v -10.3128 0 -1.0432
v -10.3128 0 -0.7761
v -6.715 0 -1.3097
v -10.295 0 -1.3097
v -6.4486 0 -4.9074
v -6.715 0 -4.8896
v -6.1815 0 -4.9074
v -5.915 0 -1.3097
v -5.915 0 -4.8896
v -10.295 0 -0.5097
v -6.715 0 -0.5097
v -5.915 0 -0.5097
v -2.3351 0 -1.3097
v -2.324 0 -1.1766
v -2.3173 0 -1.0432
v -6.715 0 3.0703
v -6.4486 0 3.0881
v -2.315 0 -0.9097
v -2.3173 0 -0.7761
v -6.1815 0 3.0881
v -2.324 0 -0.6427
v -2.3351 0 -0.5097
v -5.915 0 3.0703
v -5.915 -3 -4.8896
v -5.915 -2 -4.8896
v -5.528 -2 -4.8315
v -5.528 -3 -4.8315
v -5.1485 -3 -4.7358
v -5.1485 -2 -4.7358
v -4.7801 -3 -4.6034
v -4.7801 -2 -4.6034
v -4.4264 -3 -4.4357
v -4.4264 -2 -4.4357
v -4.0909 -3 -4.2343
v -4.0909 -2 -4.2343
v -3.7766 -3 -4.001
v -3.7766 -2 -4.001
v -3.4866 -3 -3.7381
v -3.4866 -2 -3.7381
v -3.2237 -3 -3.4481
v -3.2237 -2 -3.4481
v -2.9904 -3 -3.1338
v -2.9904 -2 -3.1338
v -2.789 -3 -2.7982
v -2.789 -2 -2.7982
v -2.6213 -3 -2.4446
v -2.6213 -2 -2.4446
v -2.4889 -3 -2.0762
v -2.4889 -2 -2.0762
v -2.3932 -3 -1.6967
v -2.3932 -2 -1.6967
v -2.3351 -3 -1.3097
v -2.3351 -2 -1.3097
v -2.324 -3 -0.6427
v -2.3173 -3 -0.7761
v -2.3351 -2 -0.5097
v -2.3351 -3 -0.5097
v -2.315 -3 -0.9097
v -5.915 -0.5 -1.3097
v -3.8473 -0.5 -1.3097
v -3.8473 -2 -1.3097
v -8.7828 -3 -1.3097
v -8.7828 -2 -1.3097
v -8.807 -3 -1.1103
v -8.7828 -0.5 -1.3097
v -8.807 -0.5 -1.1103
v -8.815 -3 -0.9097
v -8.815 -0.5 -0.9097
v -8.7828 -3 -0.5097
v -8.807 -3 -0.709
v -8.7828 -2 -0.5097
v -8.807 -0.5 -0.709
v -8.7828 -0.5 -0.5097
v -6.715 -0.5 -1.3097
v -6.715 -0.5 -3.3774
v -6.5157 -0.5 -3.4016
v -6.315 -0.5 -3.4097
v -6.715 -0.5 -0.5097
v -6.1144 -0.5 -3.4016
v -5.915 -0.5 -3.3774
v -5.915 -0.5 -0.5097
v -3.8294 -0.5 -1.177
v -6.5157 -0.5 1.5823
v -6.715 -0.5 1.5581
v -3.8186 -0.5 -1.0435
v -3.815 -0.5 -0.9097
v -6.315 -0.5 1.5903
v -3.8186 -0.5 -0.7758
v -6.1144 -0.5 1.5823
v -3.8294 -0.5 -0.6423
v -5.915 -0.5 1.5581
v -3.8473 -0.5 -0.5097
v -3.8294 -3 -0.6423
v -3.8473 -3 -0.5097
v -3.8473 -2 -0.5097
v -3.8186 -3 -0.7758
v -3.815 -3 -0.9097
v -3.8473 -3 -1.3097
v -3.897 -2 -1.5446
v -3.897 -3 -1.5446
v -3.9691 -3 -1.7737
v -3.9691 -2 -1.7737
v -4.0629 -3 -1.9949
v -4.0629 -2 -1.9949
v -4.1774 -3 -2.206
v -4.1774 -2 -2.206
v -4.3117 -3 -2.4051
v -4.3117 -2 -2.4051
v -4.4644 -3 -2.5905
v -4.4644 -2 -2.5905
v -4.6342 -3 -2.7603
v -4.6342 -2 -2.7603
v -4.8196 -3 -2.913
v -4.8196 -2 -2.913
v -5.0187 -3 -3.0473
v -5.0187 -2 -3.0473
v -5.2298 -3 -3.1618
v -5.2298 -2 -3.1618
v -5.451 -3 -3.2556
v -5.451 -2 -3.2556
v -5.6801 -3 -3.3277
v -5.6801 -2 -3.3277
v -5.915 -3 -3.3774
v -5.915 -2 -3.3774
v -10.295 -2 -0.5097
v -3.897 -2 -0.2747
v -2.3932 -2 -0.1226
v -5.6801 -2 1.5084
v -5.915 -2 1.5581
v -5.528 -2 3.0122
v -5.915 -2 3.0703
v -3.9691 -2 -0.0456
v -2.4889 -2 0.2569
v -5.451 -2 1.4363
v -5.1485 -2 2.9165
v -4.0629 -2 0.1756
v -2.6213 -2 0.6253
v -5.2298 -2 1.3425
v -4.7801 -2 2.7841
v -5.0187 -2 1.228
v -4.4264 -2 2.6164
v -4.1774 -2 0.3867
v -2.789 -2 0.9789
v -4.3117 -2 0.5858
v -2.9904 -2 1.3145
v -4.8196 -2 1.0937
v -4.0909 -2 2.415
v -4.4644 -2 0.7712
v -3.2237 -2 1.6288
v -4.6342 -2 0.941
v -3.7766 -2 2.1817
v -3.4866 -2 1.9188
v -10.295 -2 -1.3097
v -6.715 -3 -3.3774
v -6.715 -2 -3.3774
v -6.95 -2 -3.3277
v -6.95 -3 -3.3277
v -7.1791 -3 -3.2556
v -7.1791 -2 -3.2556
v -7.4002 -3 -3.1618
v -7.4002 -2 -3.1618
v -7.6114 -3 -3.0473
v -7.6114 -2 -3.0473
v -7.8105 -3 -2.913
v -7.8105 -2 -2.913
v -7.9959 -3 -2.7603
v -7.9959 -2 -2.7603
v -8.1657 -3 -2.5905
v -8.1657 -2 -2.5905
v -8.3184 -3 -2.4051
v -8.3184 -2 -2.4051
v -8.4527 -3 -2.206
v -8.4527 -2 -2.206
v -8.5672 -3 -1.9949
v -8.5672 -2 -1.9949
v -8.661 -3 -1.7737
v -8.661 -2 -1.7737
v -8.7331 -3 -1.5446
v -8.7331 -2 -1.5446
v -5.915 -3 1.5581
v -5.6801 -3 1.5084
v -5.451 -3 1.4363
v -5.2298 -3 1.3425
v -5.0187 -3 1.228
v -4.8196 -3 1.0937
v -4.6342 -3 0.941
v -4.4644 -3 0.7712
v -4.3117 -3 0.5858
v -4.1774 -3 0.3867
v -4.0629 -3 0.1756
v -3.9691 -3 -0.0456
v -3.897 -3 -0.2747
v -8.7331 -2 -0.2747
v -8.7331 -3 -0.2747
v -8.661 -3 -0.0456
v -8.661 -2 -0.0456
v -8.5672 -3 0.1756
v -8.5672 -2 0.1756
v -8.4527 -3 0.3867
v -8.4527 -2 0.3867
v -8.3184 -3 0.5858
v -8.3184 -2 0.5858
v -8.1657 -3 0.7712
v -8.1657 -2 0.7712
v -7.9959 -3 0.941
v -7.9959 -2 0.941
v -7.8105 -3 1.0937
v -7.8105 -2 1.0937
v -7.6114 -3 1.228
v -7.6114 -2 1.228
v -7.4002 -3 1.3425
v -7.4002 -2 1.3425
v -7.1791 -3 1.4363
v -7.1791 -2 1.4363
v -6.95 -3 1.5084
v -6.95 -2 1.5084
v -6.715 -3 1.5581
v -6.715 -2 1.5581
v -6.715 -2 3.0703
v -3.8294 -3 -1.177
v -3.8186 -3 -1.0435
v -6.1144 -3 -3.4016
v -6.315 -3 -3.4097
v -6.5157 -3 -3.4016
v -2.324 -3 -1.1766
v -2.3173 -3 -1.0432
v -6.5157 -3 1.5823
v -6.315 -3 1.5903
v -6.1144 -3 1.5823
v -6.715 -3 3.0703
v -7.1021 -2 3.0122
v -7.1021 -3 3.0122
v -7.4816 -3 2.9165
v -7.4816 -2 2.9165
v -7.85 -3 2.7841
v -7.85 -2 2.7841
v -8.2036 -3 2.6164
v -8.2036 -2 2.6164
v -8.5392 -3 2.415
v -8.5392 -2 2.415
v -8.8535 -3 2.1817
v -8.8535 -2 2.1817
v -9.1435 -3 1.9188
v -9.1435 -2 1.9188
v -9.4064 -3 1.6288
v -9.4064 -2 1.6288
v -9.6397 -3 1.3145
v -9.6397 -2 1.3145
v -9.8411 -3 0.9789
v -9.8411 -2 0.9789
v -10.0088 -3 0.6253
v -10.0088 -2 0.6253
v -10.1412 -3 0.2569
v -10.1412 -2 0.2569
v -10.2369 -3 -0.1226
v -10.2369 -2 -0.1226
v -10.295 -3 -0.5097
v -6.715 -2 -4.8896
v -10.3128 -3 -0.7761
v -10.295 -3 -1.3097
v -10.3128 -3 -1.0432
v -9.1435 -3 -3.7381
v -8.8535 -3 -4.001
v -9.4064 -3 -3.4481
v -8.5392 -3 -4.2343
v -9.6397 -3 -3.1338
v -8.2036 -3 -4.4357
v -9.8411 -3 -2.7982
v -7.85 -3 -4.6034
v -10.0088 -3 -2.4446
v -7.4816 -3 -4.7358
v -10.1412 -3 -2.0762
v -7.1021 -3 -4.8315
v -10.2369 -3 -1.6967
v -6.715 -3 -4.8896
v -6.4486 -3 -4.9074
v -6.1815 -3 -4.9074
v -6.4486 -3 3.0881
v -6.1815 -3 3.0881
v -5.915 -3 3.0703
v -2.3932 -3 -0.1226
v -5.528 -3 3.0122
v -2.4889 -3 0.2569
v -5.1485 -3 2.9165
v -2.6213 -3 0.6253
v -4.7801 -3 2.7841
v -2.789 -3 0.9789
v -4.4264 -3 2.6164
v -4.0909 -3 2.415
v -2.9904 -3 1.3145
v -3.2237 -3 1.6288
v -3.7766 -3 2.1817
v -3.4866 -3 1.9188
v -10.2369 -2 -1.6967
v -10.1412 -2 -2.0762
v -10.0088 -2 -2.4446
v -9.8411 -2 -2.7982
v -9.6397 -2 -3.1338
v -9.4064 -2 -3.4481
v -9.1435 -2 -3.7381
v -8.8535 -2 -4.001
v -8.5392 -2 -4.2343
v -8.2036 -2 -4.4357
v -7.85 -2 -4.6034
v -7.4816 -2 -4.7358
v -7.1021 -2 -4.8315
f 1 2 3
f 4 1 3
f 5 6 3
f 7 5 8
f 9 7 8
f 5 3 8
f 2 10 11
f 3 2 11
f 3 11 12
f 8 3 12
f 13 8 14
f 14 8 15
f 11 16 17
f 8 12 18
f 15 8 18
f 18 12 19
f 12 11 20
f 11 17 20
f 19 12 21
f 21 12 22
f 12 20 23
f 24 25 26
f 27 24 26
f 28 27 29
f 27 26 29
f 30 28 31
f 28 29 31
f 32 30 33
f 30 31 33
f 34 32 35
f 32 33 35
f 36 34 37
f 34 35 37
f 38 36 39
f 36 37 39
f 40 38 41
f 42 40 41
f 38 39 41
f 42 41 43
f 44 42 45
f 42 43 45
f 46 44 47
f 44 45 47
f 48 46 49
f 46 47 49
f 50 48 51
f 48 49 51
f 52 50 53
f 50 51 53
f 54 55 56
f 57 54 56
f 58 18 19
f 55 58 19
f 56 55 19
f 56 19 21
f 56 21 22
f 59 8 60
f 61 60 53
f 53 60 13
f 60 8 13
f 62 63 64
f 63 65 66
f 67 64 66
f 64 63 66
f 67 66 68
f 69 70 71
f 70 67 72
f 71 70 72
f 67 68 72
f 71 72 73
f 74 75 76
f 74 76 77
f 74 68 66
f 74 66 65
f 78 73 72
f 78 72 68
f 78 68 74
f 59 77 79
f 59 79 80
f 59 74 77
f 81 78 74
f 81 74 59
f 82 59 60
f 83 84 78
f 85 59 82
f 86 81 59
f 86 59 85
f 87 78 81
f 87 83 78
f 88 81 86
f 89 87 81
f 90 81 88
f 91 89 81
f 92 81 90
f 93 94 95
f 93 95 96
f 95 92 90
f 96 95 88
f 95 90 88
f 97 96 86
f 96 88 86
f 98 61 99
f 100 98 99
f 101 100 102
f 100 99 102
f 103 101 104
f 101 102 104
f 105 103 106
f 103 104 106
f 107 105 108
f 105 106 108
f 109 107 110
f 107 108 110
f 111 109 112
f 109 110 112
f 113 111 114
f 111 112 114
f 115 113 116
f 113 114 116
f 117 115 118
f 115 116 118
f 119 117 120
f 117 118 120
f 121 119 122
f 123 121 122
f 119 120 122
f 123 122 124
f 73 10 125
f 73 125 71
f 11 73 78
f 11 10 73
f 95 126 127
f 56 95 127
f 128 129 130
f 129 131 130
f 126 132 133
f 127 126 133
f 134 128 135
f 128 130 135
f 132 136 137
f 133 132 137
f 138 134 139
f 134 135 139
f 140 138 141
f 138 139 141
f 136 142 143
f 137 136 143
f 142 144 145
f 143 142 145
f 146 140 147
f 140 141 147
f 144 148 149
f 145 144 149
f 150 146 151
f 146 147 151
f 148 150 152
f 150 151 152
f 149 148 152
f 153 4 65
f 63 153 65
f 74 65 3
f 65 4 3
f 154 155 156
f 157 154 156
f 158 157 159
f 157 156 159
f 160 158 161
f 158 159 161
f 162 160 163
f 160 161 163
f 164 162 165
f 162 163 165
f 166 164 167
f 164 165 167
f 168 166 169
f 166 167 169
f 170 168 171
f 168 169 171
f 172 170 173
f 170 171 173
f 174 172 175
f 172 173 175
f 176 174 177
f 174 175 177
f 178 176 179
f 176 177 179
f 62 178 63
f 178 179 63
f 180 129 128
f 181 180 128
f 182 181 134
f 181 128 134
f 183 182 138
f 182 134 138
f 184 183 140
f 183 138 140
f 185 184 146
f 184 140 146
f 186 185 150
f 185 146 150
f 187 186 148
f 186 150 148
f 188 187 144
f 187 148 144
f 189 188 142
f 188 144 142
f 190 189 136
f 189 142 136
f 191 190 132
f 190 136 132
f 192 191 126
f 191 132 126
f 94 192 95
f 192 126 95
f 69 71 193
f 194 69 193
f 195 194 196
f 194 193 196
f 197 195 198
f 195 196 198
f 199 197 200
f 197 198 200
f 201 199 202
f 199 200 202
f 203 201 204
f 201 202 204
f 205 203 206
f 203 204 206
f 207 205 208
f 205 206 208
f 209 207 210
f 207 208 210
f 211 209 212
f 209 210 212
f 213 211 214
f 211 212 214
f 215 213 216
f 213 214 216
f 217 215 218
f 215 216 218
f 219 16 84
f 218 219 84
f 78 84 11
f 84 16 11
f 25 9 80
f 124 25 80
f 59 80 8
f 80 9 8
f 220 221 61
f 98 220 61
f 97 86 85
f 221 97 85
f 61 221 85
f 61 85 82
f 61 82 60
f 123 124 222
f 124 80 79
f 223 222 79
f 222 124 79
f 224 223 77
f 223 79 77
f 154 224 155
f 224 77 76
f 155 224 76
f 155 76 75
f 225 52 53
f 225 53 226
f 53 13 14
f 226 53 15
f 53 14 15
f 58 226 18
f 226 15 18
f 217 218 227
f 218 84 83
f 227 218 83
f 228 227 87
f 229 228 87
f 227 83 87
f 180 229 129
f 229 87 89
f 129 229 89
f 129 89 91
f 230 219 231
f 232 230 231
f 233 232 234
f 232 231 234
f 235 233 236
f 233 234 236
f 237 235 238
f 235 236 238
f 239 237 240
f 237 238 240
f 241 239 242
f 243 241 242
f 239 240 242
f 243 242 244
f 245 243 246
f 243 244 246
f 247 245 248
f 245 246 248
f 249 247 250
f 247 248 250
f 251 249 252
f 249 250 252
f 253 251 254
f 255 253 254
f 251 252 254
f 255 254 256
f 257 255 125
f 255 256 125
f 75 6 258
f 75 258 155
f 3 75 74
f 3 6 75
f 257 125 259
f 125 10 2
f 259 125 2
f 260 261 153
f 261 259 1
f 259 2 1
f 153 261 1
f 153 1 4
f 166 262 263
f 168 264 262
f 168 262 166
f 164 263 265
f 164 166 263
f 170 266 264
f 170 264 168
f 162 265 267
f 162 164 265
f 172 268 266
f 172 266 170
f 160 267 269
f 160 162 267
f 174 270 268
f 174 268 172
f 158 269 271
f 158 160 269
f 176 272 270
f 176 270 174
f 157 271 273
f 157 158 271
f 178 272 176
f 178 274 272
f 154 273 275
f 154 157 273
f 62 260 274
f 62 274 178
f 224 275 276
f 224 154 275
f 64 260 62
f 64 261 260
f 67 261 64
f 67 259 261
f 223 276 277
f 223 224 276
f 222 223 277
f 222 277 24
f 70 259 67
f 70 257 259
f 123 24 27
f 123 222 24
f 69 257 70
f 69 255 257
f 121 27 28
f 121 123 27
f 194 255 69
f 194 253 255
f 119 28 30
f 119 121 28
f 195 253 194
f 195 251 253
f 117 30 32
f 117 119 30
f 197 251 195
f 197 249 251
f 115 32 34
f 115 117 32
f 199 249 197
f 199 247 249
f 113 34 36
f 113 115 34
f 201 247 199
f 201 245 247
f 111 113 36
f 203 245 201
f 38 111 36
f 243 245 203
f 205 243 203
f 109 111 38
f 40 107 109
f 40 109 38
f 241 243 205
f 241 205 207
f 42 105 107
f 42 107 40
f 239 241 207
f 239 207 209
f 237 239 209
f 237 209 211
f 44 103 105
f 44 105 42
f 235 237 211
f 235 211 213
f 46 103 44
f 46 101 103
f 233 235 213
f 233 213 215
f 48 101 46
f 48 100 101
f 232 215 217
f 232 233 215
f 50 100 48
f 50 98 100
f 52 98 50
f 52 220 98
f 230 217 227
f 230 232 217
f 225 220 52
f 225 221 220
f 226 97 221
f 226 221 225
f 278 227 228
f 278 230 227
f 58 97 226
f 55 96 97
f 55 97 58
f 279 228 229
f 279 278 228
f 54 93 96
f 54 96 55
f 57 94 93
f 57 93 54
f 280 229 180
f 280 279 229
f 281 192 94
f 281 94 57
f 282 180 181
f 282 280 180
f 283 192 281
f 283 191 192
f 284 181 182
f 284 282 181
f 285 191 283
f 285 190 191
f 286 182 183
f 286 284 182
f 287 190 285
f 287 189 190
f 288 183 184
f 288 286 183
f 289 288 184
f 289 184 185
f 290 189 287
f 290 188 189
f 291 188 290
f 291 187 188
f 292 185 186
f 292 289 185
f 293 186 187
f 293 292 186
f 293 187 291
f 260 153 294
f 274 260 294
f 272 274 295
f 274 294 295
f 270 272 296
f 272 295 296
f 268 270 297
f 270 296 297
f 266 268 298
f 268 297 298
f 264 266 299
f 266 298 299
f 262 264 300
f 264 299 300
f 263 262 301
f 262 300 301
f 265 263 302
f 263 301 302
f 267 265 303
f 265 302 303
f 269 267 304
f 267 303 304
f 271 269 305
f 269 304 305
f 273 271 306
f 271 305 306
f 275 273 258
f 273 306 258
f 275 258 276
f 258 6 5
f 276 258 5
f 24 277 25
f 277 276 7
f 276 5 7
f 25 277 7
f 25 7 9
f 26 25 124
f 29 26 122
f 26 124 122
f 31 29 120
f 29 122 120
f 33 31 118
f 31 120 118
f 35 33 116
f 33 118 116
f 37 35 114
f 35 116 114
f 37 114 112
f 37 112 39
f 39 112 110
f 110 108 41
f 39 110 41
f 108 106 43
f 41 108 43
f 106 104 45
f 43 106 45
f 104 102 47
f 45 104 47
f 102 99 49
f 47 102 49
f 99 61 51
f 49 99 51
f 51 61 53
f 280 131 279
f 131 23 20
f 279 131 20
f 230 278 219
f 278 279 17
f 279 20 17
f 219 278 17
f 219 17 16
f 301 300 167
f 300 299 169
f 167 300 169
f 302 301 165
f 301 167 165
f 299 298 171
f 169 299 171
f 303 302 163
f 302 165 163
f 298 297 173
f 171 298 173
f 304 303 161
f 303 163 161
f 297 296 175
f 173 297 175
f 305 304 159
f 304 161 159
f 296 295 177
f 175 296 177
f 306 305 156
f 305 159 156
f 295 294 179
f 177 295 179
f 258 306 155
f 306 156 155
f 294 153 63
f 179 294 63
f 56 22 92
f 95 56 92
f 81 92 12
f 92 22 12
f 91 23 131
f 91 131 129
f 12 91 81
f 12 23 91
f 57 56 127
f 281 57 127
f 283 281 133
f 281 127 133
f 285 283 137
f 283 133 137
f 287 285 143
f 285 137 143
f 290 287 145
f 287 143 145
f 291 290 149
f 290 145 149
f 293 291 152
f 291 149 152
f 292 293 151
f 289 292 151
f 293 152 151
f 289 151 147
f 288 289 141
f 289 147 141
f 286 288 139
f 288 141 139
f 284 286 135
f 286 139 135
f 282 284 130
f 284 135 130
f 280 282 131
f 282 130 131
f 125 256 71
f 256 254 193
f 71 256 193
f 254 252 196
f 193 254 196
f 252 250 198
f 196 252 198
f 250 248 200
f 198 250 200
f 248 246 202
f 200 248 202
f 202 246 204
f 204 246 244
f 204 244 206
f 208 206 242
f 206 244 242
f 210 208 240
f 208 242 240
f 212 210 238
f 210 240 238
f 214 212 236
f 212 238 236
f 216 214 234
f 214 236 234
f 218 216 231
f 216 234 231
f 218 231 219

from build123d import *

# Parameters (mm, degrees)
F1_DEPTH = 3
F0_W     = 0.8
F0_H     = 0.8
F2_DEPTH = 0.5
F3_DEPTH = 2


with BuildPart() as f1:
    # F0 (on Front) → F1 (new body)
    with BuildSketch(Plane.XZ):
        with BuildLine():
            Line((-6.7150478527, -4.8896004256), (-6.7150478527, -3.377443213))
            ThreePointArc((-6.7150478527, -3.377443213), (-8.0828148057, -2.6774176301), (-8.7828403885, -1.3096506771))
            Line((-8.7828403885, -1.3096506771), (-10.2949976011, -1.3096506771))
            ThreePointArc((-10.2949976011, -1.3096506771), (-9.1434749774, -3.7380778019), (-6.7150478527, -4.8896004256))
        make_face()
        with BuildLine():
            Line((-5.9150478527, -4.8896004256), (-5.9150478527, -3.377443213))
            ThreePointArc((-5.9150478527, -3.377443213), (-6.3150478527, -3.4096506771), (-6.7150478527, -3.377443213))
            Line((-6.7150478527, -3.377443213), (-6.7150478527, -4.8896004256))
            Line((-6.7150478527, -4.8896004256), (-5.9150478527, -4.8896004256))
        make_face()
        with BuildLine():
            Line((-2.3350981043, -1.3096506771), (-3.8472553168, -1.3096506771))
            ThreePointArc((-3.8472553168, -1.3096506771), (-4.5472808997, -2.6774176301), (-5.9150478527, -3.377443213))
            Line((-5.9150478527, -3.377443213), (-5.9150478527, -4.8896004256))
            ThreePointArc((-5.9150478527, -4.8896004256), (-3.4866207279, -3.7380778019), (-2.3350981043, -1.3096506771))
        make_face()
        with BuildLine():
            ThreePointArc((-3.8472553168, -0.5096506771), (-3.8231127272, -0.7090033991), (-3.8150478527, -0.9096506771))
            ThreePointArc((-3.8150478527, -0.9096506771), (-3.8231127272, -1.1102979552), (-3.8472553168, -1.3096506771))
            Line((-3.8472553168, -1.3096506771), (-2.3350981043, -1.3096506771))
            Line((-2.3350981043, -1.3096506771), (-2.3350981043, -0.5096506771))
            Line((-2.3350981043, -0.5096506771), (-3.8472553168, -0.5096506771))
        make_face()
        with BuildLine():
            ThreePointArc((-5.9150478527, 1.5581418587), (-4.5472808997, 0.8581162758), (-3.8472553168, -0.5096506771))
            Line((-3.8472553168, -0.5096506771), (-2.3350981043, -0.5096506771))
            ThreePointArc((-2.3350981043, -0.5096506771), (-3.4866207279, 1.9187764476), (-5.9150478527, 3.0702990713))
            Line((-5.9150478527, 3.0702990713), (-5.9150478527, 1.5581418587))
        make_face()
        with BuildLine():
            ThreePointArc((-6.7150478527, 1.5581418587), (-6.3150478527, 1.5903493229), (-5.9150478527, 1.5581418587))
            Line((-5.9150478527, 1.5581418587), (-5.9150478527, 3.0702990713))
            Line((-5.9150478527, 3.0702990713), (-6.7150478527, 3.0702990713))
            Line((-6.7150478527, 3.0702990713), (-6.7150478527, 1.5581418587))
        make_face()
        with BuildLine():
            ThreePointArc((-8.7828403885, -0.5096506771), (-8.0828148057, 0.8581162758), (-6.7150478527, 1.5581418587))
            Line((-6.7150478527, 1.5581418587), (-6.7150478527, 3.0702990713))
            ThreePointArc((-6.7150478527, 3.0702990713), (-9.1434749774, 1.9187764476), (-10.2949976011, -0.5096506771))
            Line((-10.2949976011, -0.5096506771), (-8.7828403885, -0.5096506771))
        make_face()
        with BuildLine():
            ThreePointArc((-8.7828403885, -1.3096506771), (-8.8150478527, -0.9096506771), (-8.7828403885, -0.5096506771))
            Line((-8.7828403885, -0.5096506771), (-10.2949976011, -0.5096506771))
            Line((-10.2949976011, -0.5096506771), (-10.2949976011, -1.3096506771))
            Line((-10.2949976011, -1.3096506771), (-8.7828403885, -1.3096506771))
        make_face()
        with BuildLine():
            Line((-6.7150478527, 3.0702990713), (-5.9150478527, 3.0702990713))
            ThreePointArc((-5.9150478527, 3.0702990713), (-6.3150478527, 3.0903493229), (-6.7150478527, 3.0702990713))
        make_face()
        with BuildLine():
            ThreePointArc((-2.3150478527, -0.9096506771), (-2.3200635603, -0.7093995769), (-2.3350981043, -0.5096506771))
            Line((-2.3350981043, -0.5096506771), (-2.3350981043, -1.3096506771))
            ThreePointArc((-2.3350981043, -1.3096506771), (-2.3200635603, -1.1099017774), (-2.3150478527, -0.9096506771))
        make_face()
        with BuildLine():
            Line((-10.2949976011, -1.3096506771), (-10.2949976011, -0.5096506771))
            ThreePointArc((-10.2949976011, -0.5096506771), (-10.3150478527, -0.9096506771), (-10.2949976011, -1.3096506771))
        make_face()
        with BuildLine():
            ThreePointArc((-6.7150478527, -4.8896004256), (-6.3150478527, -4.9096506771), (-5.9150478527, -4.8896004256))
            Line((-5.9150478527, -4.8896004256), (-6.7150478527, -4.8896004256))
        make_face()
    extrude(amount=F1_DEPTH)

    # F0 (on Front) → F2 (join)
    with BuildSketch(Plane.XZ):
        with BuildLine():
            ThreePointArc((-6.7150478527, -3.377443213), (-6.3150478527, -3.4096506771), (-5.9150478527, -3.377443213))
            Line((-5.9150478527, -3.377443213), (-5.9150478527, -1.3096506771))
            Line((-5.9150478527, -1.3096506771), (-6.7150478527, -1.3096506771))
            Line((-6.7150478527, -1.3096506771), (-6.7150478527, -3.377443213))
        make_face()
        with Locations((-6.3150478527, -0.9096506771)):
            Rectangle(F0_W, F0_H)
        with BuildLine():
            Line((-6.7150478527, -1.3096506771), (-6.7150478527, -0.5096506771))
            Line((-6.7150478527, -0.5096506771), (-8.7828403885, -0.5096506771))
            ThreePointArc((-8.7828403885, -0.5096506771), (-8.8150478527, -0.9096506771), (-8.7828403885, -1.3096506771))
            Line((-8.7828403885, -1.3096506771), (-6.7150478527, -1.3096506771))
        make_face()
        with BuildLine():
            Line((-5.9150478527, -0.5096506771), (-5.9150478527, 1.5581418587))
            ThreePointArc((-5.9150478527, 1.5581418587), (-6.3150478527, 1.5903493229), (-6.7150478527, 1.5581418587))
            Line((-6.7150478527, 1.5581418587), (-6.7150478527, -0.5096506771))
            Line((-6.7150478527, -0.5096506771), (-5.9150478527, -0.5096506771))
        make_face()
        with BuildLine():
            ThreePointArc((-3.8472553168, -1.3096506771), (-3.8231127272, -1.1102979552), (-3.8150478527, -0.9096506771))
            ThreePointArc((-3.8150478527, -0.9096506771), (-3.8231127272, -0.7090033991), (-3.8472553168, -0.5096506771))
            Line((-3.8472553168, -0.5096506771), (-5.9150478527, -0.5096506771))
            Line((-5.9150478527, -0.5096506771), (-5.9150478527, -1.3096506771))
            Line((-5.9150478527, -1.3096506771), (-3.8472553168, -1.3096506771))
        make_face()
    extrude(amount=F2_DEPTH)

    # F0 (on Front) → F3 (cut)
    with BuildSketch(Plane.XZ):
        with BuildLine():
            Line((-2.3350981043, -1.3096506771), (-3.8472553168, -1.3096506771))
            ThreePointArc((-3.8472553168, -1.3096506771), (-4.5472808997, -2.6774176301), (-5.9150478527, -3.377443213))
            Line((-5.9150478527, -3.377443213), (-5.9150478527, -4.8896004256))
            ThreePointArc((-5.9150478527, -4.8896004256), (-3.4866207279, -3.7380778019), (-2.3350981043, -1.3096506771))
        make_face()
        with BuildLine():
            Line((-6.7150478527, -4.8896004256), (-6.7150478527, -3.377443213))
            ThreePointArc((-6.7150478527, -3.377443213), (-8.0828148057, -2.6774176301), (-8.7828403885, -1.3096506771))
            Line((-8.7828403885, -1.3096506771), (-10.2949976011, -1.3096506771))
            ThreePointArc((-10.2949976011, -1.3096506771), (-9.1434749774, -3.7380778019), (-6.7150478527, -4.8896004256))
        make_face()
        with BuildLine():
            ThreePointArc((-8.7828403885, -0.5096506771), (-8.0828148057, 0.8581162758), (-6.7150478527, 1.5581418587))
            Line((-6.7150478527, 1.5581418587), (-6.7150478527, 3.0702990713))
            ThreePointArc((-6.7150478527, 3.0702990713), (-9.1434749774, 1.9187764476), (-10.2949976011, -0.5096506771))
            Line((-10.2949976011, -0.5096506771), (-8.7828403885, -0.5096506771))
        make_face()
        with BuildLine():
            ThreePointArc((-5.9150478527, 1.5581418587), (-4.5472808997, 0.8581162758), (-3.8472553168, -0.5096506771))
            Line((-3.8472553168, -0.5096506771), (-2.3350981043, -0.5096506771))
            ThreePointArc((-2.3350981043, -0.5096506771), (-3.4866207279, 1.9187764476), (-5.9150478527, 3.0702990713))
            Line((-5.9150478527, 3.0702990713), (-5.9150478527, 1.5581418587))
        make_face()
    extrude(amount=F3_DEPTH, mode=Mode.SUBTRACT)


solid = f1.part
